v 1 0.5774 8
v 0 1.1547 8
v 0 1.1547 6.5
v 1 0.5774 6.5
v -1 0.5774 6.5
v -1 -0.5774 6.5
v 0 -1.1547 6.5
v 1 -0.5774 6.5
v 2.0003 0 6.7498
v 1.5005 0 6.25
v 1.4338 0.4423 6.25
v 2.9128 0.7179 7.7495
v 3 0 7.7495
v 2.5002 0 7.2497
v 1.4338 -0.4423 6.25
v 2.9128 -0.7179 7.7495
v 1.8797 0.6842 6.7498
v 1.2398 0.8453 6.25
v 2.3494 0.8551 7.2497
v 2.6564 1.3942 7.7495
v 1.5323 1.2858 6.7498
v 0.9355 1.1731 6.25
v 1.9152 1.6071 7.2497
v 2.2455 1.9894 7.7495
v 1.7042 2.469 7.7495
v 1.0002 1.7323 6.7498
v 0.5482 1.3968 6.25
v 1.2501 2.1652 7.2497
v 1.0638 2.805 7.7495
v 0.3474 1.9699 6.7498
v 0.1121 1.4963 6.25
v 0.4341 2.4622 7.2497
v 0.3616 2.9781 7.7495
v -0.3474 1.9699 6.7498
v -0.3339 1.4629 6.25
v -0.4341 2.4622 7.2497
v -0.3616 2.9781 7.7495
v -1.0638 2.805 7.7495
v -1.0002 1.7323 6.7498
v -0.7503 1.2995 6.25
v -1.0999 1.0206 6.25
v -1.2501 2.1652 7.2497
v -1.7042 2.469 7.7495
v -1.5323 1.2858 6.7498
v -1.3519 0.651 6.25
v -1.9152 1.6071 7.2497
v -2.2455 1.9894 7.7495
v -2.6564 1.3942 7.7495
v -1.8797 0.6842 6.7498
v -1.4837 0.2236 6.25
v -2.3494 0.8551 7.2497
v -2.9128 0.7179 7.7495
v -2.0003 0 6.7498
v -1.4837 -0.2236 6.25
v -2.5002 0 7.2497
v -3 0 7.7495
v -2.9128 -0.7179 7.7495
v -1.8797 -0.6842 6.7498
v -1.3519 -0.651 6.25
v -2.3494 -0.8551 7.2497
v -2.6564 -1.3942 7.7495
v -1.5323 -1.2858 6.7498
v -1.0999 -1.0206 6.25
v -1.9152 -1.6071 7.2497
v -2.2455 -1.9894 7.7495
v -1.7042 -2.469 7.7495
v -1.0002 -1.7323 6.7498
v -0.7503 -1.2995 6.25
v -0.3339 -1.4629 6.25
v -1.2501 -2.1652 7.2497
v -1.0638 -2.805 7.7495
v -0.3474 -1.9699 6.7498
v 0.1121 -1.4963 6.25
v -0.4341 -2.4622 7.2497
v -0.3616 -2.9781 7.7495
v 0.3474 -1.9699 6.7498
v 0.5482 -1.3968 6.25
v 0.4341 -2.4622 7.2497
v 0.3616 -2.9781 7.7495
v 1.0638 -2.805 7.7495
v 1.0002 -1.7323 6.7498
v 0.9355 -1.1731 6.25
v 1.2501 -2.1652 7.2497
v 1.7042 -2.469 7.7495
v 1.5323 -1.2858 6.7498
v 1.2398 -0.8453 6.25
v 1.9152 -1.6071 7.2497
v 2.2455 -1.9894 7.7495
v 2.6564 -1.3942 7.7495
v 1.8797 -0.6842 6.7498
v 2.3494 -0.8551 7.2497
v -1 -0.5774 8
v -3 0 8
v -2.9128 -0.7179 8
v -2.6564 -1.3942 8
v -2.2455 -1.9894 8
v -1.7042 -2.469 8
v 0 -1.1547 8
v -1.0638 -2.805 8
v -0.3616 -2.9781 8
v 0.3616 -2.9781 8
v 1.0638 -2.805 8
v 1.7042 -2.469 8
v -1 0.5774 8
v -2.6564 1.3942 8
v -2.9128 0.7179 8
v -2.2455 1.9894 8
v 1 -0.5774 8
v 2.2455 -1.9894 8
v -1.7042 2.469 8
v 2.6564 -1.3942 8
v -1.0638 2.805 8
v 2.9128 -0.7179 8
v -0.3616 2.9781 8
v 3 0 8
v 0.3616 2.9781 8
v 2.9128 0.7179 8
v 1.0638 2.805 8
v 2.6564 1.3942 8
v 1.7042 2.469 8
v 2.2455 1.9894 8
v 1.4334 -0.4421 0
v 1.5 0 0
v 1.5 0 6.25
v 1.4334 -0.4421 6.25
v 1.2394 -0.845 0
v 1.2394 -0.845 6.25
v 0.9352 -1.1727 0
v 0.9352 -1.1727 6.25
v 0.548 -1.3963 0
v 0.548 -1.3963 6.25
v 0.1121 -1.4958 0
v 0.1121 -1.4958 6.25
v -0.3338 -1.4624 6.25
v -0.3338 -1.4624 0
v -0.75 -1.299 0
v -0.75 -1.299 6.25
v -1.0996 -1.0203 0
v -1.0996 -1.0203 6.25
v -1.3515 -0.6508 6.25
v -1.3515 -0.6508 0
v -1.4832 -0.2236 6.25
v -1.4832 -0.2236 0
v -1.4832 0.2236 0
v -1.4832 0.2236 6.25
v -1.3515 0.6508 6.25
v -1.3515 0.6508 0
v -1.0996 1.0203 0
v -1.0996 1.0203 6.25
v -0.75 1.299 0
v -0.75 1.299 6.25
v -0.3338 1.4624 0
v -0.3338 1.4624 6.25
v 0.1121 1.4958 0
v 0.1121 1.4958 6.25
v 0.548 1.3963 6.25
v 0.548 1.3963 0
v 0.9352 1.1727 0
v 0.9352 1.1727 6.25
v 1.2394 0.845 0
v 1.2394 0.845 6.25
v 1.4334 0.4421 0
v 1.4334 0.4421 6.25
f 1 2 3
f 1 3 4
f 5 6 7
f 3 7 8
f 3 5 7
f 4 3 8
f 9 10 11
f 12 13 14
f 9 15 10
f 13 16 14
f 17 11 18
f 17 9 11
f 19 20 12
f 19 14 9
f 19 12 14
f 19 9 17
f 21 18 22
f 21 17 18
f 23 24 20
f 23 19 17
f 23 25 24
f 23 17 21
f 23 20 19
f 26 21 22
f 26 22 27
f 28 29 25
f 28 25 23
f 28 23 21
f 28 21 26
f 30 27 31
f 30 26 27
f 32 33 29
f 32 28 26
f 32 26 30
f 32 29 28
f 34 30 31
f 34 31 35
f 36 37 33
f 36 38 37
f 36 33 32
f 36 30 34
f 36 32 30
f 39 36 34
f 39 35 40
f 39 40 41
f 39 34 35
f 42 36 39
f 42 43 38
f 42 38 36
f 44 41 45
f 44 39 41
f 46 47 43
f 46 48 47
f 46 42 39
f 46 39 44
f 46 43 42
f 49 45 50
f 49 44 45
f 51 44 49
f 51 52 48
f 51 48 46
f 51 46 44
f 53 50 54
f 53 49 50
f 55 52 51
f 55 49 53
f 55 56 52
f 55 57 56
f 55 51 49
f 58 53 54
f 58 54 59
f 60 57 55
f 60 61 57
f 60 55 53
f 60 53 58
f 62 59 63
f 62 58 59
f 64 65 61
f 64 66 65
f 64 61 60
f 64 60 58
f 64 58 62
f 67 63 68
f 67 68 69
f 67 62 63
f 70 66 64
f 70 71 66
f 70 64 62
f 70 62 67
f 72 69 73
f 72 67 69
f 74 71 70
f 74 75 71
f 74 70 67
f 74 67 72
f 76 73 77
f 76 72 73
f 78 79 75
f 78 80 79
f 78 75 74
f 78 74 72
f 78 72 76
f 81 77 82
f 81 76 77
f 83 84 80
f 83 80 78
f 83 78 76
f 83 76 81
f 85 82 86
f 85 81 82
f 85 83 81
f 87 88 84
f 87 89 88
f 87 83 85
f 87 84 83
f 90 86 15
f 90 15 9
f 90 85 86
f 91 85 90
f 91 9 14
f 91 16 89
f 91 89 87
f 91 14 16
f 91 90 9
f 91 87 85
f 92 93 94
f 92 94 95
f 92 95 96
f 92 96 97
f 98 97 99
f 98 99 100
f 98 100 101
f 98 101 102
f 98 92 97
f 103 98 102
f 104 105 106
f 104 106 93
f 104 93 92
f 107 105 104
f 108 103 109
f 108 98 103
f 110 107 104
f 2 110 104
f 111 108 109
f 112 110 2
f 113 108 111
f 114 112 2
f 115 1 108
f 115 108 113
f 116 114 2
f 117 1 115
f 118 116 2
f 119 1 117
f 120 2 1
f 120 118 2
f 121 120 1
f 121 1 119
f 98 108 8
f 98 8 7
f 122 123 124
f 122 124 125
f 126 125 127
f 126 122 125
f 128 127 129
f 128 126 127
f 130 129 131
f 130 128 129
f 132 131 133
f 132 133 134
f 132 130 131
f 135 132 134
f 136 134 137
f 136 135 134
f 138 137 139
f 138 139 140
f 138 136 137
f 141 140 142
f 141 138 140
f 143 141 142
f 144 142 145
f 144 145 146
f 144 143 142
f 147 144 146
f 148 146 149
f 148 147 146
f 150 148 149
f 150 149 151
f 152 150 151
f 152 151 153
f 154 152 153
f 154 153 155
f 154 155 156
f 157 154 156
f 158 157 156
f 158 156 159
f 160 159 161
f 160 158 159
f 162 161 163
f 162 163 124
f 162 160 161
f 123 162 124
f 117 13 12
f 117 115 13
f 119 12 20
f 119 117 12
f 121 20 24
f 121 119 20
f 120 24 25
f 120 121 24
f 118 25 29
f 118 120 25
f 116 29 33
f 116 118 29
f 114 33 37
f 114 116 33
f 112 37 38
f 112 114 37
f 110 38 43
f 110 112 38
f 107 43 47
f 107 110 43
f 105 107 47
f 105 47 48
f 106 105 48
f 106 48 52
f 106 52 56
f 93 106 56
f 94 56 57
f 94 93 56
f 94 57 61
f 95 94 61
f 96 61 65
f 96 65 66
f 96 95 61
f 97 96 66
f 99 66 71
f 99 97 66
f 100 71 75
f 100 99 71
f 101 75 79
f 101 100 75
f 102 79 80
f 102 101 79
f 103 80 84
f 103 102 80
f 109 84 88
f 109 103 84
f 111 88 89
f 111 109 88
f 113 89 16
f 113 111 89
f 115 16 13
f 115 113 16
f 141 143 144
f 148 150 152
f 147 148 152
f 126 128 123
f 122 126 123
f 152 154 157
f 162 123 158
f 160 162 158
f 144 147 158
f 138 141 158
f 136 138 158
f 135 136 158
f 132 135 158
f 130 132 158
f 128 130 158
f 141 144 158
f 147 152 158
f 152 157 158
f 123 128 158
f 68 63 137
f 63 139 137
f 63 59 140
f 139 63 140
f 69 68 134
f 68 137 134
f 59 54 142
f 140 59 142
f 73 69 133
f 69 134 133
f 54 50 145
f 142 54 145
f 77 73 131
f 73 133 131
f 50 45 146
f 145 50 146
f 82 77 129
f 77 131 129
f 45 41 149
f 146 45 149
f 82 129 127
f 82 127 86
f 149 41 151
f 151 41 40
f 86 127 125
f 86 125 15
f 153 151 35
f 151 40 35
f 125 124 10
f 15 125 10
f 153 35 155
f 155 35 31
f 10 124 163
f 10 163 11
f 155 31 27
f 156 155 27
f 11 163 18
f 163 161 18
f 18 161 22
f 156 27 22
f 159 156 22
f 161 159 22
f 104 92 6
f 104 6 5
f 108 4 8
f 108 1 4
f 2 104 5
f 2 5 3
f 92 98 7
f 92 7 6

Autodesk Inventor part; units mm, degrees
ref_plane "YZ Plane" through (0, 0, 0) normal (1, 0, 0) x (0, 1, 0)
ref_plane "XZ Plane" through (0, 0, 0) normal (0, 1, 0) x (-1, 0, 0)
ref_plane "XY Plane" through (0, 0, 0) normal (0, 0, 1) x (1, 0, 0)
sketch "スケッチ1" plane through (0, 0, 0) normal (0, 0, 1) x (1, 0, 0)
  circle A0 centre (0, 0) radius 1.5
  dimension "d0" = 3
extrude "押し出し1" add sketch "スケッチ1" along normal blind 8
thread "ねじ1" size "M3x0.5" class "6g" standard "ANSI Metric M Profile" full length
sketch "スケッチ2" plane through (0, 0, 8) normal (0, 0, 1) x (1, 0, 0)
  circle A0 centre (0, 0) radius 3
  dimension "d5" = 6
extrude "押し出し2" add sketch "スケッチ2" against normal blind 1.75
chamfer "面取り1" distance 1.5 angle 45 1 edges at (-3, 0, 6.25)
sketch "スケッチ3" plane through (0, 0, 8) normal (0, 0, 1) x (1, 0, 0)
  line L0 (0, 1.1547) -> (1, 0.5774)
  line L1 (1, 0.5774) -> (1, -0.5774)
  line L2 (1, -0.5774) -> (0, -1.1547)
  line L3 (0, -1.1547) -> (-1, -0.5774)
  line L4 (-1, -0.5774) -> (-1, 0.5774)
  line L5 (-1, 0.5774) -> (0, 1.1547)
  point P0 (0, 0)
  point P1 (0, 0)
  dimension "d11" = 2
extrude "押し出し3" cut sketch "スケッチ3" against normal blind 1.5
properties part number "m3皿ネジ8" material "鉄 灰色"
